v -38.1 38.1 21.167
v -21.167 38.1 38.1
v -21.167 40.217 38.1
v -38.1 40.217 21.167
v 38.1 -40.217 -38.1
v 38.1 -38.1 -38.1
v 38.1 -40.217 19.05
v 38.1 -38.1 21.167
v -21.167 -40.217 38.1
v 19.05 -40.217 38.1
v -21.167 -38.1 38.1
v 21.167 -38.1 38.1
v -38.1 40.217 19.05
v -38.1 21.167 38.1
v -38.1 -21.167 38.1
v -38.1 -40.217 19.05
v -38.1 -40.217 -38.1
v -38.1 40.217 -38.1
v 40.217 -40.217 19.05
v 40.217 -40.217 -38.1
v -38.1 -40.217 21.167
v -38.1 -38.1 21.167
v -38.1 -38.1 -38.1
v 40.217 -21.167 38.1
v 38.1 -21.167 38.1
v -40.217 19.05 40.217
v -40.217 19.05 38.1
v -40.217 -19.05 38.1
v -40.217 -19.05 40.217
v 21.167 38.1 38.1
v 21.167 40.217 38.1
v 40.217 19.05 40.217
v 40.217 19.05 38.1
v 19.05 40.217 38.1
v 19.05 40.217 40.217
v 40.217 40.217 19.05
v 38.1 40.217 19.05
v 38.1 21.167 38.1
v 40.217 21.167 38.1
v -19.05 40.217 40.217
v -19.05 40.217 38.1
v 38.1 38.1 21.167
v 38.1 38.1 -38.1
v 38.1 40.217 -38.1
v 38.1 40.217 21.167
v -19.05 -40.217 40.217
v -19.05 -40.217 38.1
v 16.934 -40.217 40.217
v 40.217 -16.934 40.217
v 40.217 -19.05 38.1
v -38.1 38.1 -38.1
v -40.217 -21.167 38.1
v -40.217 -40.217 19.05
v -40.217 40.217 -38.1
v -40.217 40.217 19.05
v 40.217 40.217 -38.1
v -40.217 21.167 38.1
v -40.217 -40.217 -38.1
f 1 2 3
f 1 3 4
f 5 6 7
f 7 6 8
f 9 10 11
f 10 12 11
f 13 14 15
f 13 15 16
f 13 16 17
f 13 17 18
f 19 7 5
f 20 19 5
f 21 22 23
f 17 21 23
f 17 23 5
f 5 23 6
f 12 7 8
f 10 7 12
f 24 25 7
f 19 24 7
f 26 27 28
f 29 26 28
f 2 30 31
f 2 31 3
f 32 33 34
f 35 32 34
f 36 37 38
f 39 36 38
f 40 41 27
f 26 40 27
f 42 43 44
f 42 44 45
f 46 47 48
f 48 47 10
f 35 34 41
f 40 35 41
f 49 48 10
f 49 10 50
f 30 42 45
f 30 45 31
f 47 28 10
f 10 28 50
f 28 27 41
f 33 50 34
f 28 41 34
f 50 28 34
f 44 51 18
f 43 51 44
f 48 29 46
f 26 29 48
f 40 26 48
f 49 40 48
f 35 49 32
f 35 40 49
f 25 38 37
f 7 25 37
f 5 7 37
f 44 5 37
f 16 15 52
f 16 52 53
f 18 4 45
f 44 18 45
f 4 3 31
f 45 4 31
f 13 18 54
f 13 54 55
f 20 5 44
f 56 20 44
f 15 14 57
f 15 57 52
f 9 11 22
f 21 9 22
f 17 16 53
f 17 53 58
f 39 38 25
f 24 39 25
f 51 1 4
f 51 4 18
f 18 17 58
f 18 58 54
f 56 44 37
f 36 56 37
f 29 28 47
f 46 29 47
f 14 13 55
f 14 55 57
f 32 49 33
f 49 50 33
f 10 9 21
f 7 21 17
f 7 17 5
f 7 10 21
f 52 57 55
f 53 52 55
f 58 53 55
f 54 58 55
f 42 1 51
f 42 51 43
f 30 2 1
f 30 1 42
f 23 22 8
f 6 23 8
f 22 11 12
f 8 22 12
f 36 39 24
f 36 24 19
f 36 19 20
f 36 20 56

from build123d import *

# Parameters (mm, degrees)
F3_START   = 38.1
F3_DEPTH   = 2.1166666667
F4_START   = -38.1
F4_DEPTH   = 2.1166666667
F5_START   = 38.1
F5_DEPTH   = 2.1166666667
F6_START   = -38.1
F6_DEPTH   = 2.1166666667
F7_START   = 38.1
F7_DEPTH   = 2.1166666667
F9_SIZE2   = 1.496456
F9_SIZE    = 2.116657
F9_2_SIZE2 = 1.496456
F9_2_SIZE  = 2.116657


# Not quite as in the source:
# - a fillet or chamfer is up to 0.001 mm smaller than in the source, because OpenCascade refuses the exact size


with BuildPart() as f3:
    # F0 (on Front) → F3 (new body)
    with BuildSketch(Plane.XZ.offset(F3_START)):
        Polygon((38.1, 21.1666666667), (21.1666666667, 38.1), (-21.1666666667, 38.1), (-38.1, 21.1666666667), (-38.1, -21.1666666667), (-21.1666666667, -38.1), (21.1666666667, -38.1), (38.1, -21.1666666667), align=None)
        Polygon((-21.1666666667, -38.1), (-38.1, -21.1666666667), (-38.1, -38.1), align=None)
        Polygon((38.1, -38.1), (38.1, -21.1666666667), (21.1666666667, -38.1), align=None)
    extrude(amount=F3_DEPTH)

    # F9#2 (size 2.1166666667 and 1.4964661159 in the source; OpenCascade refuses exactly that, so slightly less here)
    f9_2_edges = [f3.edges().sort_by_distance(p)[0] for p in [
        (29.633333, -40.216667, 29.633333),
    ]]
    f9_2_side = f3.faces().sort_by_distance((29.633333, -39.158333, 29.633333))[0]
    chamfer(f9_2_edges, length=F9_2_SIZE, length2=F9_2_SIZE2, reference=f9_2_side)


with BuildPart() as f4:
    # F0 (on Front) → F4 (new body)
    with BuildSketch(Plane.XZ.offset(F4_START)):
        Polygon((38.1, 21.1666666667), (21.1666666667, 38.1), (-21.1666666667, 38.1), (-38.1, 21.1666666667), (-38.1, -21.1666666667), (-21.1666666667, -38.1), (21.1666666667, -38.1), (38.1, -21.1666666667), align=None)
        Polygon((38.1, -38.1), (38.1, -21.1666666667), (21.1666666667, -38.1), align=None)
        Polygon((-21.1666666667, -38.1), (-38.1, -21.1666666667), (-38.1, -38.1), align=None)
    extrude(amount=-F4_DEPTH)


with BuildPart() as f5:
    # F1 (on Right) → F5 (new body)
    with BuildSketch(Plane.YZ.offset(F5_START)):
        Polygon((21.1666666667, 38.1), (-21.1666666667, 38.1), (-40.2166666667, 19.05), (-40.2166666667, -19.05), (-21.1666666667, -38.1), (21.1666666667, -38.1), (40.2166666667, -19.05), (40.2166666667, 19.05), align=None)
        Polygon((-21.1666666667, -38.1), (-40.2166666667, -19.05), (-40.2166666667, -38.1), align=None)
        Polygon((40.2166666667, -38.1), (40.2166666667, -19.05), (21.1666666667, -38.1), align=None)
    extrude(amount=F5_DEPTH)


with BuildPart() as f6:
    # F1 (on Right) → F6 (new body)
    with BuildSketch(Plane.YZ.offset(F6_START)):
        Polygon((21.1666666667, 38.1), (-21.1666666667, 38.1), (-40.2166666667, 19.05), (-40.2166666667, -19.05), (-21.1666666667, -38.1), (21.1666666667, -38.1), (40.2166666667, -19.05), (40.2166666667, 19.05), align=None)
        Polygon((40.2166666667, -38.1), (40.2166666667, -19.05), (21.1666666667, -38.1), align=None)
        Polygon((-21.1666666667, -38.1), (-40.2166666667, -19.05), (-40.2166666667, -38.1), align=None)
    extrude(amount=-F6_DEPTH)


with BuildPart() as f7:
    # F2 (on Top) → F7 (new body)
    with BuildSketch(Plane.XY.offset(F7_START)):
        Polygon((40.2166666667, 19.05), (38.1, 21.1666666667), (38.1, -21.1666666667), (40.2166666667, -19.05), align=None)
        Polygon((-21.1666666667, 38.1), (21.1666666667, 38.1), (19.05, 40.2166666667), (-19.05, 40.2166666667), align=None)
        Polygon((38.1, 21.1666666667), (21.1666666667, 38.1), (-21.1666666667, 38.1), (-38.1, 21.1666666667), (-38.1, -21.1666666667), (-21.1666666667, -38.1), (21.1666666667, -38.1), (38.1, -21.1666666667), align=None)
        Polygon((19.05, -40.2166666667), (21.1666666667, -38.1), (-21.1666666667, -38.1), (-19.05, -40.2166666667), align=None)
        Polygon((-38.1, -21.1666666667), (-38.1, 21.1666666667), (-40.2166666667, 19.05), (-40.2166666667, -19.05), align=None)
    extrude(amount=F7_DEPTH)

    # F9 (size 2.1166666667 and 1.4964661159 in the source; OpenCascade refuses exactly that, so slightly less here)
    f9_edges = [f7.edges().sort_by_distance(p)[0] for p in [
        (29.633333, -29.633333, 40.216667),
    ]]
    f9_side = f7.faces().sort_by_distance((29.633333, -29.633333, 39.158333))[0]
    chamfer(f9_edges, length=F9_SIZE, length2=F9_SIZE2, reference=f9_side)


solid = Compound([f3.part, f4.part, f5.part, f6.part, f7.part])
